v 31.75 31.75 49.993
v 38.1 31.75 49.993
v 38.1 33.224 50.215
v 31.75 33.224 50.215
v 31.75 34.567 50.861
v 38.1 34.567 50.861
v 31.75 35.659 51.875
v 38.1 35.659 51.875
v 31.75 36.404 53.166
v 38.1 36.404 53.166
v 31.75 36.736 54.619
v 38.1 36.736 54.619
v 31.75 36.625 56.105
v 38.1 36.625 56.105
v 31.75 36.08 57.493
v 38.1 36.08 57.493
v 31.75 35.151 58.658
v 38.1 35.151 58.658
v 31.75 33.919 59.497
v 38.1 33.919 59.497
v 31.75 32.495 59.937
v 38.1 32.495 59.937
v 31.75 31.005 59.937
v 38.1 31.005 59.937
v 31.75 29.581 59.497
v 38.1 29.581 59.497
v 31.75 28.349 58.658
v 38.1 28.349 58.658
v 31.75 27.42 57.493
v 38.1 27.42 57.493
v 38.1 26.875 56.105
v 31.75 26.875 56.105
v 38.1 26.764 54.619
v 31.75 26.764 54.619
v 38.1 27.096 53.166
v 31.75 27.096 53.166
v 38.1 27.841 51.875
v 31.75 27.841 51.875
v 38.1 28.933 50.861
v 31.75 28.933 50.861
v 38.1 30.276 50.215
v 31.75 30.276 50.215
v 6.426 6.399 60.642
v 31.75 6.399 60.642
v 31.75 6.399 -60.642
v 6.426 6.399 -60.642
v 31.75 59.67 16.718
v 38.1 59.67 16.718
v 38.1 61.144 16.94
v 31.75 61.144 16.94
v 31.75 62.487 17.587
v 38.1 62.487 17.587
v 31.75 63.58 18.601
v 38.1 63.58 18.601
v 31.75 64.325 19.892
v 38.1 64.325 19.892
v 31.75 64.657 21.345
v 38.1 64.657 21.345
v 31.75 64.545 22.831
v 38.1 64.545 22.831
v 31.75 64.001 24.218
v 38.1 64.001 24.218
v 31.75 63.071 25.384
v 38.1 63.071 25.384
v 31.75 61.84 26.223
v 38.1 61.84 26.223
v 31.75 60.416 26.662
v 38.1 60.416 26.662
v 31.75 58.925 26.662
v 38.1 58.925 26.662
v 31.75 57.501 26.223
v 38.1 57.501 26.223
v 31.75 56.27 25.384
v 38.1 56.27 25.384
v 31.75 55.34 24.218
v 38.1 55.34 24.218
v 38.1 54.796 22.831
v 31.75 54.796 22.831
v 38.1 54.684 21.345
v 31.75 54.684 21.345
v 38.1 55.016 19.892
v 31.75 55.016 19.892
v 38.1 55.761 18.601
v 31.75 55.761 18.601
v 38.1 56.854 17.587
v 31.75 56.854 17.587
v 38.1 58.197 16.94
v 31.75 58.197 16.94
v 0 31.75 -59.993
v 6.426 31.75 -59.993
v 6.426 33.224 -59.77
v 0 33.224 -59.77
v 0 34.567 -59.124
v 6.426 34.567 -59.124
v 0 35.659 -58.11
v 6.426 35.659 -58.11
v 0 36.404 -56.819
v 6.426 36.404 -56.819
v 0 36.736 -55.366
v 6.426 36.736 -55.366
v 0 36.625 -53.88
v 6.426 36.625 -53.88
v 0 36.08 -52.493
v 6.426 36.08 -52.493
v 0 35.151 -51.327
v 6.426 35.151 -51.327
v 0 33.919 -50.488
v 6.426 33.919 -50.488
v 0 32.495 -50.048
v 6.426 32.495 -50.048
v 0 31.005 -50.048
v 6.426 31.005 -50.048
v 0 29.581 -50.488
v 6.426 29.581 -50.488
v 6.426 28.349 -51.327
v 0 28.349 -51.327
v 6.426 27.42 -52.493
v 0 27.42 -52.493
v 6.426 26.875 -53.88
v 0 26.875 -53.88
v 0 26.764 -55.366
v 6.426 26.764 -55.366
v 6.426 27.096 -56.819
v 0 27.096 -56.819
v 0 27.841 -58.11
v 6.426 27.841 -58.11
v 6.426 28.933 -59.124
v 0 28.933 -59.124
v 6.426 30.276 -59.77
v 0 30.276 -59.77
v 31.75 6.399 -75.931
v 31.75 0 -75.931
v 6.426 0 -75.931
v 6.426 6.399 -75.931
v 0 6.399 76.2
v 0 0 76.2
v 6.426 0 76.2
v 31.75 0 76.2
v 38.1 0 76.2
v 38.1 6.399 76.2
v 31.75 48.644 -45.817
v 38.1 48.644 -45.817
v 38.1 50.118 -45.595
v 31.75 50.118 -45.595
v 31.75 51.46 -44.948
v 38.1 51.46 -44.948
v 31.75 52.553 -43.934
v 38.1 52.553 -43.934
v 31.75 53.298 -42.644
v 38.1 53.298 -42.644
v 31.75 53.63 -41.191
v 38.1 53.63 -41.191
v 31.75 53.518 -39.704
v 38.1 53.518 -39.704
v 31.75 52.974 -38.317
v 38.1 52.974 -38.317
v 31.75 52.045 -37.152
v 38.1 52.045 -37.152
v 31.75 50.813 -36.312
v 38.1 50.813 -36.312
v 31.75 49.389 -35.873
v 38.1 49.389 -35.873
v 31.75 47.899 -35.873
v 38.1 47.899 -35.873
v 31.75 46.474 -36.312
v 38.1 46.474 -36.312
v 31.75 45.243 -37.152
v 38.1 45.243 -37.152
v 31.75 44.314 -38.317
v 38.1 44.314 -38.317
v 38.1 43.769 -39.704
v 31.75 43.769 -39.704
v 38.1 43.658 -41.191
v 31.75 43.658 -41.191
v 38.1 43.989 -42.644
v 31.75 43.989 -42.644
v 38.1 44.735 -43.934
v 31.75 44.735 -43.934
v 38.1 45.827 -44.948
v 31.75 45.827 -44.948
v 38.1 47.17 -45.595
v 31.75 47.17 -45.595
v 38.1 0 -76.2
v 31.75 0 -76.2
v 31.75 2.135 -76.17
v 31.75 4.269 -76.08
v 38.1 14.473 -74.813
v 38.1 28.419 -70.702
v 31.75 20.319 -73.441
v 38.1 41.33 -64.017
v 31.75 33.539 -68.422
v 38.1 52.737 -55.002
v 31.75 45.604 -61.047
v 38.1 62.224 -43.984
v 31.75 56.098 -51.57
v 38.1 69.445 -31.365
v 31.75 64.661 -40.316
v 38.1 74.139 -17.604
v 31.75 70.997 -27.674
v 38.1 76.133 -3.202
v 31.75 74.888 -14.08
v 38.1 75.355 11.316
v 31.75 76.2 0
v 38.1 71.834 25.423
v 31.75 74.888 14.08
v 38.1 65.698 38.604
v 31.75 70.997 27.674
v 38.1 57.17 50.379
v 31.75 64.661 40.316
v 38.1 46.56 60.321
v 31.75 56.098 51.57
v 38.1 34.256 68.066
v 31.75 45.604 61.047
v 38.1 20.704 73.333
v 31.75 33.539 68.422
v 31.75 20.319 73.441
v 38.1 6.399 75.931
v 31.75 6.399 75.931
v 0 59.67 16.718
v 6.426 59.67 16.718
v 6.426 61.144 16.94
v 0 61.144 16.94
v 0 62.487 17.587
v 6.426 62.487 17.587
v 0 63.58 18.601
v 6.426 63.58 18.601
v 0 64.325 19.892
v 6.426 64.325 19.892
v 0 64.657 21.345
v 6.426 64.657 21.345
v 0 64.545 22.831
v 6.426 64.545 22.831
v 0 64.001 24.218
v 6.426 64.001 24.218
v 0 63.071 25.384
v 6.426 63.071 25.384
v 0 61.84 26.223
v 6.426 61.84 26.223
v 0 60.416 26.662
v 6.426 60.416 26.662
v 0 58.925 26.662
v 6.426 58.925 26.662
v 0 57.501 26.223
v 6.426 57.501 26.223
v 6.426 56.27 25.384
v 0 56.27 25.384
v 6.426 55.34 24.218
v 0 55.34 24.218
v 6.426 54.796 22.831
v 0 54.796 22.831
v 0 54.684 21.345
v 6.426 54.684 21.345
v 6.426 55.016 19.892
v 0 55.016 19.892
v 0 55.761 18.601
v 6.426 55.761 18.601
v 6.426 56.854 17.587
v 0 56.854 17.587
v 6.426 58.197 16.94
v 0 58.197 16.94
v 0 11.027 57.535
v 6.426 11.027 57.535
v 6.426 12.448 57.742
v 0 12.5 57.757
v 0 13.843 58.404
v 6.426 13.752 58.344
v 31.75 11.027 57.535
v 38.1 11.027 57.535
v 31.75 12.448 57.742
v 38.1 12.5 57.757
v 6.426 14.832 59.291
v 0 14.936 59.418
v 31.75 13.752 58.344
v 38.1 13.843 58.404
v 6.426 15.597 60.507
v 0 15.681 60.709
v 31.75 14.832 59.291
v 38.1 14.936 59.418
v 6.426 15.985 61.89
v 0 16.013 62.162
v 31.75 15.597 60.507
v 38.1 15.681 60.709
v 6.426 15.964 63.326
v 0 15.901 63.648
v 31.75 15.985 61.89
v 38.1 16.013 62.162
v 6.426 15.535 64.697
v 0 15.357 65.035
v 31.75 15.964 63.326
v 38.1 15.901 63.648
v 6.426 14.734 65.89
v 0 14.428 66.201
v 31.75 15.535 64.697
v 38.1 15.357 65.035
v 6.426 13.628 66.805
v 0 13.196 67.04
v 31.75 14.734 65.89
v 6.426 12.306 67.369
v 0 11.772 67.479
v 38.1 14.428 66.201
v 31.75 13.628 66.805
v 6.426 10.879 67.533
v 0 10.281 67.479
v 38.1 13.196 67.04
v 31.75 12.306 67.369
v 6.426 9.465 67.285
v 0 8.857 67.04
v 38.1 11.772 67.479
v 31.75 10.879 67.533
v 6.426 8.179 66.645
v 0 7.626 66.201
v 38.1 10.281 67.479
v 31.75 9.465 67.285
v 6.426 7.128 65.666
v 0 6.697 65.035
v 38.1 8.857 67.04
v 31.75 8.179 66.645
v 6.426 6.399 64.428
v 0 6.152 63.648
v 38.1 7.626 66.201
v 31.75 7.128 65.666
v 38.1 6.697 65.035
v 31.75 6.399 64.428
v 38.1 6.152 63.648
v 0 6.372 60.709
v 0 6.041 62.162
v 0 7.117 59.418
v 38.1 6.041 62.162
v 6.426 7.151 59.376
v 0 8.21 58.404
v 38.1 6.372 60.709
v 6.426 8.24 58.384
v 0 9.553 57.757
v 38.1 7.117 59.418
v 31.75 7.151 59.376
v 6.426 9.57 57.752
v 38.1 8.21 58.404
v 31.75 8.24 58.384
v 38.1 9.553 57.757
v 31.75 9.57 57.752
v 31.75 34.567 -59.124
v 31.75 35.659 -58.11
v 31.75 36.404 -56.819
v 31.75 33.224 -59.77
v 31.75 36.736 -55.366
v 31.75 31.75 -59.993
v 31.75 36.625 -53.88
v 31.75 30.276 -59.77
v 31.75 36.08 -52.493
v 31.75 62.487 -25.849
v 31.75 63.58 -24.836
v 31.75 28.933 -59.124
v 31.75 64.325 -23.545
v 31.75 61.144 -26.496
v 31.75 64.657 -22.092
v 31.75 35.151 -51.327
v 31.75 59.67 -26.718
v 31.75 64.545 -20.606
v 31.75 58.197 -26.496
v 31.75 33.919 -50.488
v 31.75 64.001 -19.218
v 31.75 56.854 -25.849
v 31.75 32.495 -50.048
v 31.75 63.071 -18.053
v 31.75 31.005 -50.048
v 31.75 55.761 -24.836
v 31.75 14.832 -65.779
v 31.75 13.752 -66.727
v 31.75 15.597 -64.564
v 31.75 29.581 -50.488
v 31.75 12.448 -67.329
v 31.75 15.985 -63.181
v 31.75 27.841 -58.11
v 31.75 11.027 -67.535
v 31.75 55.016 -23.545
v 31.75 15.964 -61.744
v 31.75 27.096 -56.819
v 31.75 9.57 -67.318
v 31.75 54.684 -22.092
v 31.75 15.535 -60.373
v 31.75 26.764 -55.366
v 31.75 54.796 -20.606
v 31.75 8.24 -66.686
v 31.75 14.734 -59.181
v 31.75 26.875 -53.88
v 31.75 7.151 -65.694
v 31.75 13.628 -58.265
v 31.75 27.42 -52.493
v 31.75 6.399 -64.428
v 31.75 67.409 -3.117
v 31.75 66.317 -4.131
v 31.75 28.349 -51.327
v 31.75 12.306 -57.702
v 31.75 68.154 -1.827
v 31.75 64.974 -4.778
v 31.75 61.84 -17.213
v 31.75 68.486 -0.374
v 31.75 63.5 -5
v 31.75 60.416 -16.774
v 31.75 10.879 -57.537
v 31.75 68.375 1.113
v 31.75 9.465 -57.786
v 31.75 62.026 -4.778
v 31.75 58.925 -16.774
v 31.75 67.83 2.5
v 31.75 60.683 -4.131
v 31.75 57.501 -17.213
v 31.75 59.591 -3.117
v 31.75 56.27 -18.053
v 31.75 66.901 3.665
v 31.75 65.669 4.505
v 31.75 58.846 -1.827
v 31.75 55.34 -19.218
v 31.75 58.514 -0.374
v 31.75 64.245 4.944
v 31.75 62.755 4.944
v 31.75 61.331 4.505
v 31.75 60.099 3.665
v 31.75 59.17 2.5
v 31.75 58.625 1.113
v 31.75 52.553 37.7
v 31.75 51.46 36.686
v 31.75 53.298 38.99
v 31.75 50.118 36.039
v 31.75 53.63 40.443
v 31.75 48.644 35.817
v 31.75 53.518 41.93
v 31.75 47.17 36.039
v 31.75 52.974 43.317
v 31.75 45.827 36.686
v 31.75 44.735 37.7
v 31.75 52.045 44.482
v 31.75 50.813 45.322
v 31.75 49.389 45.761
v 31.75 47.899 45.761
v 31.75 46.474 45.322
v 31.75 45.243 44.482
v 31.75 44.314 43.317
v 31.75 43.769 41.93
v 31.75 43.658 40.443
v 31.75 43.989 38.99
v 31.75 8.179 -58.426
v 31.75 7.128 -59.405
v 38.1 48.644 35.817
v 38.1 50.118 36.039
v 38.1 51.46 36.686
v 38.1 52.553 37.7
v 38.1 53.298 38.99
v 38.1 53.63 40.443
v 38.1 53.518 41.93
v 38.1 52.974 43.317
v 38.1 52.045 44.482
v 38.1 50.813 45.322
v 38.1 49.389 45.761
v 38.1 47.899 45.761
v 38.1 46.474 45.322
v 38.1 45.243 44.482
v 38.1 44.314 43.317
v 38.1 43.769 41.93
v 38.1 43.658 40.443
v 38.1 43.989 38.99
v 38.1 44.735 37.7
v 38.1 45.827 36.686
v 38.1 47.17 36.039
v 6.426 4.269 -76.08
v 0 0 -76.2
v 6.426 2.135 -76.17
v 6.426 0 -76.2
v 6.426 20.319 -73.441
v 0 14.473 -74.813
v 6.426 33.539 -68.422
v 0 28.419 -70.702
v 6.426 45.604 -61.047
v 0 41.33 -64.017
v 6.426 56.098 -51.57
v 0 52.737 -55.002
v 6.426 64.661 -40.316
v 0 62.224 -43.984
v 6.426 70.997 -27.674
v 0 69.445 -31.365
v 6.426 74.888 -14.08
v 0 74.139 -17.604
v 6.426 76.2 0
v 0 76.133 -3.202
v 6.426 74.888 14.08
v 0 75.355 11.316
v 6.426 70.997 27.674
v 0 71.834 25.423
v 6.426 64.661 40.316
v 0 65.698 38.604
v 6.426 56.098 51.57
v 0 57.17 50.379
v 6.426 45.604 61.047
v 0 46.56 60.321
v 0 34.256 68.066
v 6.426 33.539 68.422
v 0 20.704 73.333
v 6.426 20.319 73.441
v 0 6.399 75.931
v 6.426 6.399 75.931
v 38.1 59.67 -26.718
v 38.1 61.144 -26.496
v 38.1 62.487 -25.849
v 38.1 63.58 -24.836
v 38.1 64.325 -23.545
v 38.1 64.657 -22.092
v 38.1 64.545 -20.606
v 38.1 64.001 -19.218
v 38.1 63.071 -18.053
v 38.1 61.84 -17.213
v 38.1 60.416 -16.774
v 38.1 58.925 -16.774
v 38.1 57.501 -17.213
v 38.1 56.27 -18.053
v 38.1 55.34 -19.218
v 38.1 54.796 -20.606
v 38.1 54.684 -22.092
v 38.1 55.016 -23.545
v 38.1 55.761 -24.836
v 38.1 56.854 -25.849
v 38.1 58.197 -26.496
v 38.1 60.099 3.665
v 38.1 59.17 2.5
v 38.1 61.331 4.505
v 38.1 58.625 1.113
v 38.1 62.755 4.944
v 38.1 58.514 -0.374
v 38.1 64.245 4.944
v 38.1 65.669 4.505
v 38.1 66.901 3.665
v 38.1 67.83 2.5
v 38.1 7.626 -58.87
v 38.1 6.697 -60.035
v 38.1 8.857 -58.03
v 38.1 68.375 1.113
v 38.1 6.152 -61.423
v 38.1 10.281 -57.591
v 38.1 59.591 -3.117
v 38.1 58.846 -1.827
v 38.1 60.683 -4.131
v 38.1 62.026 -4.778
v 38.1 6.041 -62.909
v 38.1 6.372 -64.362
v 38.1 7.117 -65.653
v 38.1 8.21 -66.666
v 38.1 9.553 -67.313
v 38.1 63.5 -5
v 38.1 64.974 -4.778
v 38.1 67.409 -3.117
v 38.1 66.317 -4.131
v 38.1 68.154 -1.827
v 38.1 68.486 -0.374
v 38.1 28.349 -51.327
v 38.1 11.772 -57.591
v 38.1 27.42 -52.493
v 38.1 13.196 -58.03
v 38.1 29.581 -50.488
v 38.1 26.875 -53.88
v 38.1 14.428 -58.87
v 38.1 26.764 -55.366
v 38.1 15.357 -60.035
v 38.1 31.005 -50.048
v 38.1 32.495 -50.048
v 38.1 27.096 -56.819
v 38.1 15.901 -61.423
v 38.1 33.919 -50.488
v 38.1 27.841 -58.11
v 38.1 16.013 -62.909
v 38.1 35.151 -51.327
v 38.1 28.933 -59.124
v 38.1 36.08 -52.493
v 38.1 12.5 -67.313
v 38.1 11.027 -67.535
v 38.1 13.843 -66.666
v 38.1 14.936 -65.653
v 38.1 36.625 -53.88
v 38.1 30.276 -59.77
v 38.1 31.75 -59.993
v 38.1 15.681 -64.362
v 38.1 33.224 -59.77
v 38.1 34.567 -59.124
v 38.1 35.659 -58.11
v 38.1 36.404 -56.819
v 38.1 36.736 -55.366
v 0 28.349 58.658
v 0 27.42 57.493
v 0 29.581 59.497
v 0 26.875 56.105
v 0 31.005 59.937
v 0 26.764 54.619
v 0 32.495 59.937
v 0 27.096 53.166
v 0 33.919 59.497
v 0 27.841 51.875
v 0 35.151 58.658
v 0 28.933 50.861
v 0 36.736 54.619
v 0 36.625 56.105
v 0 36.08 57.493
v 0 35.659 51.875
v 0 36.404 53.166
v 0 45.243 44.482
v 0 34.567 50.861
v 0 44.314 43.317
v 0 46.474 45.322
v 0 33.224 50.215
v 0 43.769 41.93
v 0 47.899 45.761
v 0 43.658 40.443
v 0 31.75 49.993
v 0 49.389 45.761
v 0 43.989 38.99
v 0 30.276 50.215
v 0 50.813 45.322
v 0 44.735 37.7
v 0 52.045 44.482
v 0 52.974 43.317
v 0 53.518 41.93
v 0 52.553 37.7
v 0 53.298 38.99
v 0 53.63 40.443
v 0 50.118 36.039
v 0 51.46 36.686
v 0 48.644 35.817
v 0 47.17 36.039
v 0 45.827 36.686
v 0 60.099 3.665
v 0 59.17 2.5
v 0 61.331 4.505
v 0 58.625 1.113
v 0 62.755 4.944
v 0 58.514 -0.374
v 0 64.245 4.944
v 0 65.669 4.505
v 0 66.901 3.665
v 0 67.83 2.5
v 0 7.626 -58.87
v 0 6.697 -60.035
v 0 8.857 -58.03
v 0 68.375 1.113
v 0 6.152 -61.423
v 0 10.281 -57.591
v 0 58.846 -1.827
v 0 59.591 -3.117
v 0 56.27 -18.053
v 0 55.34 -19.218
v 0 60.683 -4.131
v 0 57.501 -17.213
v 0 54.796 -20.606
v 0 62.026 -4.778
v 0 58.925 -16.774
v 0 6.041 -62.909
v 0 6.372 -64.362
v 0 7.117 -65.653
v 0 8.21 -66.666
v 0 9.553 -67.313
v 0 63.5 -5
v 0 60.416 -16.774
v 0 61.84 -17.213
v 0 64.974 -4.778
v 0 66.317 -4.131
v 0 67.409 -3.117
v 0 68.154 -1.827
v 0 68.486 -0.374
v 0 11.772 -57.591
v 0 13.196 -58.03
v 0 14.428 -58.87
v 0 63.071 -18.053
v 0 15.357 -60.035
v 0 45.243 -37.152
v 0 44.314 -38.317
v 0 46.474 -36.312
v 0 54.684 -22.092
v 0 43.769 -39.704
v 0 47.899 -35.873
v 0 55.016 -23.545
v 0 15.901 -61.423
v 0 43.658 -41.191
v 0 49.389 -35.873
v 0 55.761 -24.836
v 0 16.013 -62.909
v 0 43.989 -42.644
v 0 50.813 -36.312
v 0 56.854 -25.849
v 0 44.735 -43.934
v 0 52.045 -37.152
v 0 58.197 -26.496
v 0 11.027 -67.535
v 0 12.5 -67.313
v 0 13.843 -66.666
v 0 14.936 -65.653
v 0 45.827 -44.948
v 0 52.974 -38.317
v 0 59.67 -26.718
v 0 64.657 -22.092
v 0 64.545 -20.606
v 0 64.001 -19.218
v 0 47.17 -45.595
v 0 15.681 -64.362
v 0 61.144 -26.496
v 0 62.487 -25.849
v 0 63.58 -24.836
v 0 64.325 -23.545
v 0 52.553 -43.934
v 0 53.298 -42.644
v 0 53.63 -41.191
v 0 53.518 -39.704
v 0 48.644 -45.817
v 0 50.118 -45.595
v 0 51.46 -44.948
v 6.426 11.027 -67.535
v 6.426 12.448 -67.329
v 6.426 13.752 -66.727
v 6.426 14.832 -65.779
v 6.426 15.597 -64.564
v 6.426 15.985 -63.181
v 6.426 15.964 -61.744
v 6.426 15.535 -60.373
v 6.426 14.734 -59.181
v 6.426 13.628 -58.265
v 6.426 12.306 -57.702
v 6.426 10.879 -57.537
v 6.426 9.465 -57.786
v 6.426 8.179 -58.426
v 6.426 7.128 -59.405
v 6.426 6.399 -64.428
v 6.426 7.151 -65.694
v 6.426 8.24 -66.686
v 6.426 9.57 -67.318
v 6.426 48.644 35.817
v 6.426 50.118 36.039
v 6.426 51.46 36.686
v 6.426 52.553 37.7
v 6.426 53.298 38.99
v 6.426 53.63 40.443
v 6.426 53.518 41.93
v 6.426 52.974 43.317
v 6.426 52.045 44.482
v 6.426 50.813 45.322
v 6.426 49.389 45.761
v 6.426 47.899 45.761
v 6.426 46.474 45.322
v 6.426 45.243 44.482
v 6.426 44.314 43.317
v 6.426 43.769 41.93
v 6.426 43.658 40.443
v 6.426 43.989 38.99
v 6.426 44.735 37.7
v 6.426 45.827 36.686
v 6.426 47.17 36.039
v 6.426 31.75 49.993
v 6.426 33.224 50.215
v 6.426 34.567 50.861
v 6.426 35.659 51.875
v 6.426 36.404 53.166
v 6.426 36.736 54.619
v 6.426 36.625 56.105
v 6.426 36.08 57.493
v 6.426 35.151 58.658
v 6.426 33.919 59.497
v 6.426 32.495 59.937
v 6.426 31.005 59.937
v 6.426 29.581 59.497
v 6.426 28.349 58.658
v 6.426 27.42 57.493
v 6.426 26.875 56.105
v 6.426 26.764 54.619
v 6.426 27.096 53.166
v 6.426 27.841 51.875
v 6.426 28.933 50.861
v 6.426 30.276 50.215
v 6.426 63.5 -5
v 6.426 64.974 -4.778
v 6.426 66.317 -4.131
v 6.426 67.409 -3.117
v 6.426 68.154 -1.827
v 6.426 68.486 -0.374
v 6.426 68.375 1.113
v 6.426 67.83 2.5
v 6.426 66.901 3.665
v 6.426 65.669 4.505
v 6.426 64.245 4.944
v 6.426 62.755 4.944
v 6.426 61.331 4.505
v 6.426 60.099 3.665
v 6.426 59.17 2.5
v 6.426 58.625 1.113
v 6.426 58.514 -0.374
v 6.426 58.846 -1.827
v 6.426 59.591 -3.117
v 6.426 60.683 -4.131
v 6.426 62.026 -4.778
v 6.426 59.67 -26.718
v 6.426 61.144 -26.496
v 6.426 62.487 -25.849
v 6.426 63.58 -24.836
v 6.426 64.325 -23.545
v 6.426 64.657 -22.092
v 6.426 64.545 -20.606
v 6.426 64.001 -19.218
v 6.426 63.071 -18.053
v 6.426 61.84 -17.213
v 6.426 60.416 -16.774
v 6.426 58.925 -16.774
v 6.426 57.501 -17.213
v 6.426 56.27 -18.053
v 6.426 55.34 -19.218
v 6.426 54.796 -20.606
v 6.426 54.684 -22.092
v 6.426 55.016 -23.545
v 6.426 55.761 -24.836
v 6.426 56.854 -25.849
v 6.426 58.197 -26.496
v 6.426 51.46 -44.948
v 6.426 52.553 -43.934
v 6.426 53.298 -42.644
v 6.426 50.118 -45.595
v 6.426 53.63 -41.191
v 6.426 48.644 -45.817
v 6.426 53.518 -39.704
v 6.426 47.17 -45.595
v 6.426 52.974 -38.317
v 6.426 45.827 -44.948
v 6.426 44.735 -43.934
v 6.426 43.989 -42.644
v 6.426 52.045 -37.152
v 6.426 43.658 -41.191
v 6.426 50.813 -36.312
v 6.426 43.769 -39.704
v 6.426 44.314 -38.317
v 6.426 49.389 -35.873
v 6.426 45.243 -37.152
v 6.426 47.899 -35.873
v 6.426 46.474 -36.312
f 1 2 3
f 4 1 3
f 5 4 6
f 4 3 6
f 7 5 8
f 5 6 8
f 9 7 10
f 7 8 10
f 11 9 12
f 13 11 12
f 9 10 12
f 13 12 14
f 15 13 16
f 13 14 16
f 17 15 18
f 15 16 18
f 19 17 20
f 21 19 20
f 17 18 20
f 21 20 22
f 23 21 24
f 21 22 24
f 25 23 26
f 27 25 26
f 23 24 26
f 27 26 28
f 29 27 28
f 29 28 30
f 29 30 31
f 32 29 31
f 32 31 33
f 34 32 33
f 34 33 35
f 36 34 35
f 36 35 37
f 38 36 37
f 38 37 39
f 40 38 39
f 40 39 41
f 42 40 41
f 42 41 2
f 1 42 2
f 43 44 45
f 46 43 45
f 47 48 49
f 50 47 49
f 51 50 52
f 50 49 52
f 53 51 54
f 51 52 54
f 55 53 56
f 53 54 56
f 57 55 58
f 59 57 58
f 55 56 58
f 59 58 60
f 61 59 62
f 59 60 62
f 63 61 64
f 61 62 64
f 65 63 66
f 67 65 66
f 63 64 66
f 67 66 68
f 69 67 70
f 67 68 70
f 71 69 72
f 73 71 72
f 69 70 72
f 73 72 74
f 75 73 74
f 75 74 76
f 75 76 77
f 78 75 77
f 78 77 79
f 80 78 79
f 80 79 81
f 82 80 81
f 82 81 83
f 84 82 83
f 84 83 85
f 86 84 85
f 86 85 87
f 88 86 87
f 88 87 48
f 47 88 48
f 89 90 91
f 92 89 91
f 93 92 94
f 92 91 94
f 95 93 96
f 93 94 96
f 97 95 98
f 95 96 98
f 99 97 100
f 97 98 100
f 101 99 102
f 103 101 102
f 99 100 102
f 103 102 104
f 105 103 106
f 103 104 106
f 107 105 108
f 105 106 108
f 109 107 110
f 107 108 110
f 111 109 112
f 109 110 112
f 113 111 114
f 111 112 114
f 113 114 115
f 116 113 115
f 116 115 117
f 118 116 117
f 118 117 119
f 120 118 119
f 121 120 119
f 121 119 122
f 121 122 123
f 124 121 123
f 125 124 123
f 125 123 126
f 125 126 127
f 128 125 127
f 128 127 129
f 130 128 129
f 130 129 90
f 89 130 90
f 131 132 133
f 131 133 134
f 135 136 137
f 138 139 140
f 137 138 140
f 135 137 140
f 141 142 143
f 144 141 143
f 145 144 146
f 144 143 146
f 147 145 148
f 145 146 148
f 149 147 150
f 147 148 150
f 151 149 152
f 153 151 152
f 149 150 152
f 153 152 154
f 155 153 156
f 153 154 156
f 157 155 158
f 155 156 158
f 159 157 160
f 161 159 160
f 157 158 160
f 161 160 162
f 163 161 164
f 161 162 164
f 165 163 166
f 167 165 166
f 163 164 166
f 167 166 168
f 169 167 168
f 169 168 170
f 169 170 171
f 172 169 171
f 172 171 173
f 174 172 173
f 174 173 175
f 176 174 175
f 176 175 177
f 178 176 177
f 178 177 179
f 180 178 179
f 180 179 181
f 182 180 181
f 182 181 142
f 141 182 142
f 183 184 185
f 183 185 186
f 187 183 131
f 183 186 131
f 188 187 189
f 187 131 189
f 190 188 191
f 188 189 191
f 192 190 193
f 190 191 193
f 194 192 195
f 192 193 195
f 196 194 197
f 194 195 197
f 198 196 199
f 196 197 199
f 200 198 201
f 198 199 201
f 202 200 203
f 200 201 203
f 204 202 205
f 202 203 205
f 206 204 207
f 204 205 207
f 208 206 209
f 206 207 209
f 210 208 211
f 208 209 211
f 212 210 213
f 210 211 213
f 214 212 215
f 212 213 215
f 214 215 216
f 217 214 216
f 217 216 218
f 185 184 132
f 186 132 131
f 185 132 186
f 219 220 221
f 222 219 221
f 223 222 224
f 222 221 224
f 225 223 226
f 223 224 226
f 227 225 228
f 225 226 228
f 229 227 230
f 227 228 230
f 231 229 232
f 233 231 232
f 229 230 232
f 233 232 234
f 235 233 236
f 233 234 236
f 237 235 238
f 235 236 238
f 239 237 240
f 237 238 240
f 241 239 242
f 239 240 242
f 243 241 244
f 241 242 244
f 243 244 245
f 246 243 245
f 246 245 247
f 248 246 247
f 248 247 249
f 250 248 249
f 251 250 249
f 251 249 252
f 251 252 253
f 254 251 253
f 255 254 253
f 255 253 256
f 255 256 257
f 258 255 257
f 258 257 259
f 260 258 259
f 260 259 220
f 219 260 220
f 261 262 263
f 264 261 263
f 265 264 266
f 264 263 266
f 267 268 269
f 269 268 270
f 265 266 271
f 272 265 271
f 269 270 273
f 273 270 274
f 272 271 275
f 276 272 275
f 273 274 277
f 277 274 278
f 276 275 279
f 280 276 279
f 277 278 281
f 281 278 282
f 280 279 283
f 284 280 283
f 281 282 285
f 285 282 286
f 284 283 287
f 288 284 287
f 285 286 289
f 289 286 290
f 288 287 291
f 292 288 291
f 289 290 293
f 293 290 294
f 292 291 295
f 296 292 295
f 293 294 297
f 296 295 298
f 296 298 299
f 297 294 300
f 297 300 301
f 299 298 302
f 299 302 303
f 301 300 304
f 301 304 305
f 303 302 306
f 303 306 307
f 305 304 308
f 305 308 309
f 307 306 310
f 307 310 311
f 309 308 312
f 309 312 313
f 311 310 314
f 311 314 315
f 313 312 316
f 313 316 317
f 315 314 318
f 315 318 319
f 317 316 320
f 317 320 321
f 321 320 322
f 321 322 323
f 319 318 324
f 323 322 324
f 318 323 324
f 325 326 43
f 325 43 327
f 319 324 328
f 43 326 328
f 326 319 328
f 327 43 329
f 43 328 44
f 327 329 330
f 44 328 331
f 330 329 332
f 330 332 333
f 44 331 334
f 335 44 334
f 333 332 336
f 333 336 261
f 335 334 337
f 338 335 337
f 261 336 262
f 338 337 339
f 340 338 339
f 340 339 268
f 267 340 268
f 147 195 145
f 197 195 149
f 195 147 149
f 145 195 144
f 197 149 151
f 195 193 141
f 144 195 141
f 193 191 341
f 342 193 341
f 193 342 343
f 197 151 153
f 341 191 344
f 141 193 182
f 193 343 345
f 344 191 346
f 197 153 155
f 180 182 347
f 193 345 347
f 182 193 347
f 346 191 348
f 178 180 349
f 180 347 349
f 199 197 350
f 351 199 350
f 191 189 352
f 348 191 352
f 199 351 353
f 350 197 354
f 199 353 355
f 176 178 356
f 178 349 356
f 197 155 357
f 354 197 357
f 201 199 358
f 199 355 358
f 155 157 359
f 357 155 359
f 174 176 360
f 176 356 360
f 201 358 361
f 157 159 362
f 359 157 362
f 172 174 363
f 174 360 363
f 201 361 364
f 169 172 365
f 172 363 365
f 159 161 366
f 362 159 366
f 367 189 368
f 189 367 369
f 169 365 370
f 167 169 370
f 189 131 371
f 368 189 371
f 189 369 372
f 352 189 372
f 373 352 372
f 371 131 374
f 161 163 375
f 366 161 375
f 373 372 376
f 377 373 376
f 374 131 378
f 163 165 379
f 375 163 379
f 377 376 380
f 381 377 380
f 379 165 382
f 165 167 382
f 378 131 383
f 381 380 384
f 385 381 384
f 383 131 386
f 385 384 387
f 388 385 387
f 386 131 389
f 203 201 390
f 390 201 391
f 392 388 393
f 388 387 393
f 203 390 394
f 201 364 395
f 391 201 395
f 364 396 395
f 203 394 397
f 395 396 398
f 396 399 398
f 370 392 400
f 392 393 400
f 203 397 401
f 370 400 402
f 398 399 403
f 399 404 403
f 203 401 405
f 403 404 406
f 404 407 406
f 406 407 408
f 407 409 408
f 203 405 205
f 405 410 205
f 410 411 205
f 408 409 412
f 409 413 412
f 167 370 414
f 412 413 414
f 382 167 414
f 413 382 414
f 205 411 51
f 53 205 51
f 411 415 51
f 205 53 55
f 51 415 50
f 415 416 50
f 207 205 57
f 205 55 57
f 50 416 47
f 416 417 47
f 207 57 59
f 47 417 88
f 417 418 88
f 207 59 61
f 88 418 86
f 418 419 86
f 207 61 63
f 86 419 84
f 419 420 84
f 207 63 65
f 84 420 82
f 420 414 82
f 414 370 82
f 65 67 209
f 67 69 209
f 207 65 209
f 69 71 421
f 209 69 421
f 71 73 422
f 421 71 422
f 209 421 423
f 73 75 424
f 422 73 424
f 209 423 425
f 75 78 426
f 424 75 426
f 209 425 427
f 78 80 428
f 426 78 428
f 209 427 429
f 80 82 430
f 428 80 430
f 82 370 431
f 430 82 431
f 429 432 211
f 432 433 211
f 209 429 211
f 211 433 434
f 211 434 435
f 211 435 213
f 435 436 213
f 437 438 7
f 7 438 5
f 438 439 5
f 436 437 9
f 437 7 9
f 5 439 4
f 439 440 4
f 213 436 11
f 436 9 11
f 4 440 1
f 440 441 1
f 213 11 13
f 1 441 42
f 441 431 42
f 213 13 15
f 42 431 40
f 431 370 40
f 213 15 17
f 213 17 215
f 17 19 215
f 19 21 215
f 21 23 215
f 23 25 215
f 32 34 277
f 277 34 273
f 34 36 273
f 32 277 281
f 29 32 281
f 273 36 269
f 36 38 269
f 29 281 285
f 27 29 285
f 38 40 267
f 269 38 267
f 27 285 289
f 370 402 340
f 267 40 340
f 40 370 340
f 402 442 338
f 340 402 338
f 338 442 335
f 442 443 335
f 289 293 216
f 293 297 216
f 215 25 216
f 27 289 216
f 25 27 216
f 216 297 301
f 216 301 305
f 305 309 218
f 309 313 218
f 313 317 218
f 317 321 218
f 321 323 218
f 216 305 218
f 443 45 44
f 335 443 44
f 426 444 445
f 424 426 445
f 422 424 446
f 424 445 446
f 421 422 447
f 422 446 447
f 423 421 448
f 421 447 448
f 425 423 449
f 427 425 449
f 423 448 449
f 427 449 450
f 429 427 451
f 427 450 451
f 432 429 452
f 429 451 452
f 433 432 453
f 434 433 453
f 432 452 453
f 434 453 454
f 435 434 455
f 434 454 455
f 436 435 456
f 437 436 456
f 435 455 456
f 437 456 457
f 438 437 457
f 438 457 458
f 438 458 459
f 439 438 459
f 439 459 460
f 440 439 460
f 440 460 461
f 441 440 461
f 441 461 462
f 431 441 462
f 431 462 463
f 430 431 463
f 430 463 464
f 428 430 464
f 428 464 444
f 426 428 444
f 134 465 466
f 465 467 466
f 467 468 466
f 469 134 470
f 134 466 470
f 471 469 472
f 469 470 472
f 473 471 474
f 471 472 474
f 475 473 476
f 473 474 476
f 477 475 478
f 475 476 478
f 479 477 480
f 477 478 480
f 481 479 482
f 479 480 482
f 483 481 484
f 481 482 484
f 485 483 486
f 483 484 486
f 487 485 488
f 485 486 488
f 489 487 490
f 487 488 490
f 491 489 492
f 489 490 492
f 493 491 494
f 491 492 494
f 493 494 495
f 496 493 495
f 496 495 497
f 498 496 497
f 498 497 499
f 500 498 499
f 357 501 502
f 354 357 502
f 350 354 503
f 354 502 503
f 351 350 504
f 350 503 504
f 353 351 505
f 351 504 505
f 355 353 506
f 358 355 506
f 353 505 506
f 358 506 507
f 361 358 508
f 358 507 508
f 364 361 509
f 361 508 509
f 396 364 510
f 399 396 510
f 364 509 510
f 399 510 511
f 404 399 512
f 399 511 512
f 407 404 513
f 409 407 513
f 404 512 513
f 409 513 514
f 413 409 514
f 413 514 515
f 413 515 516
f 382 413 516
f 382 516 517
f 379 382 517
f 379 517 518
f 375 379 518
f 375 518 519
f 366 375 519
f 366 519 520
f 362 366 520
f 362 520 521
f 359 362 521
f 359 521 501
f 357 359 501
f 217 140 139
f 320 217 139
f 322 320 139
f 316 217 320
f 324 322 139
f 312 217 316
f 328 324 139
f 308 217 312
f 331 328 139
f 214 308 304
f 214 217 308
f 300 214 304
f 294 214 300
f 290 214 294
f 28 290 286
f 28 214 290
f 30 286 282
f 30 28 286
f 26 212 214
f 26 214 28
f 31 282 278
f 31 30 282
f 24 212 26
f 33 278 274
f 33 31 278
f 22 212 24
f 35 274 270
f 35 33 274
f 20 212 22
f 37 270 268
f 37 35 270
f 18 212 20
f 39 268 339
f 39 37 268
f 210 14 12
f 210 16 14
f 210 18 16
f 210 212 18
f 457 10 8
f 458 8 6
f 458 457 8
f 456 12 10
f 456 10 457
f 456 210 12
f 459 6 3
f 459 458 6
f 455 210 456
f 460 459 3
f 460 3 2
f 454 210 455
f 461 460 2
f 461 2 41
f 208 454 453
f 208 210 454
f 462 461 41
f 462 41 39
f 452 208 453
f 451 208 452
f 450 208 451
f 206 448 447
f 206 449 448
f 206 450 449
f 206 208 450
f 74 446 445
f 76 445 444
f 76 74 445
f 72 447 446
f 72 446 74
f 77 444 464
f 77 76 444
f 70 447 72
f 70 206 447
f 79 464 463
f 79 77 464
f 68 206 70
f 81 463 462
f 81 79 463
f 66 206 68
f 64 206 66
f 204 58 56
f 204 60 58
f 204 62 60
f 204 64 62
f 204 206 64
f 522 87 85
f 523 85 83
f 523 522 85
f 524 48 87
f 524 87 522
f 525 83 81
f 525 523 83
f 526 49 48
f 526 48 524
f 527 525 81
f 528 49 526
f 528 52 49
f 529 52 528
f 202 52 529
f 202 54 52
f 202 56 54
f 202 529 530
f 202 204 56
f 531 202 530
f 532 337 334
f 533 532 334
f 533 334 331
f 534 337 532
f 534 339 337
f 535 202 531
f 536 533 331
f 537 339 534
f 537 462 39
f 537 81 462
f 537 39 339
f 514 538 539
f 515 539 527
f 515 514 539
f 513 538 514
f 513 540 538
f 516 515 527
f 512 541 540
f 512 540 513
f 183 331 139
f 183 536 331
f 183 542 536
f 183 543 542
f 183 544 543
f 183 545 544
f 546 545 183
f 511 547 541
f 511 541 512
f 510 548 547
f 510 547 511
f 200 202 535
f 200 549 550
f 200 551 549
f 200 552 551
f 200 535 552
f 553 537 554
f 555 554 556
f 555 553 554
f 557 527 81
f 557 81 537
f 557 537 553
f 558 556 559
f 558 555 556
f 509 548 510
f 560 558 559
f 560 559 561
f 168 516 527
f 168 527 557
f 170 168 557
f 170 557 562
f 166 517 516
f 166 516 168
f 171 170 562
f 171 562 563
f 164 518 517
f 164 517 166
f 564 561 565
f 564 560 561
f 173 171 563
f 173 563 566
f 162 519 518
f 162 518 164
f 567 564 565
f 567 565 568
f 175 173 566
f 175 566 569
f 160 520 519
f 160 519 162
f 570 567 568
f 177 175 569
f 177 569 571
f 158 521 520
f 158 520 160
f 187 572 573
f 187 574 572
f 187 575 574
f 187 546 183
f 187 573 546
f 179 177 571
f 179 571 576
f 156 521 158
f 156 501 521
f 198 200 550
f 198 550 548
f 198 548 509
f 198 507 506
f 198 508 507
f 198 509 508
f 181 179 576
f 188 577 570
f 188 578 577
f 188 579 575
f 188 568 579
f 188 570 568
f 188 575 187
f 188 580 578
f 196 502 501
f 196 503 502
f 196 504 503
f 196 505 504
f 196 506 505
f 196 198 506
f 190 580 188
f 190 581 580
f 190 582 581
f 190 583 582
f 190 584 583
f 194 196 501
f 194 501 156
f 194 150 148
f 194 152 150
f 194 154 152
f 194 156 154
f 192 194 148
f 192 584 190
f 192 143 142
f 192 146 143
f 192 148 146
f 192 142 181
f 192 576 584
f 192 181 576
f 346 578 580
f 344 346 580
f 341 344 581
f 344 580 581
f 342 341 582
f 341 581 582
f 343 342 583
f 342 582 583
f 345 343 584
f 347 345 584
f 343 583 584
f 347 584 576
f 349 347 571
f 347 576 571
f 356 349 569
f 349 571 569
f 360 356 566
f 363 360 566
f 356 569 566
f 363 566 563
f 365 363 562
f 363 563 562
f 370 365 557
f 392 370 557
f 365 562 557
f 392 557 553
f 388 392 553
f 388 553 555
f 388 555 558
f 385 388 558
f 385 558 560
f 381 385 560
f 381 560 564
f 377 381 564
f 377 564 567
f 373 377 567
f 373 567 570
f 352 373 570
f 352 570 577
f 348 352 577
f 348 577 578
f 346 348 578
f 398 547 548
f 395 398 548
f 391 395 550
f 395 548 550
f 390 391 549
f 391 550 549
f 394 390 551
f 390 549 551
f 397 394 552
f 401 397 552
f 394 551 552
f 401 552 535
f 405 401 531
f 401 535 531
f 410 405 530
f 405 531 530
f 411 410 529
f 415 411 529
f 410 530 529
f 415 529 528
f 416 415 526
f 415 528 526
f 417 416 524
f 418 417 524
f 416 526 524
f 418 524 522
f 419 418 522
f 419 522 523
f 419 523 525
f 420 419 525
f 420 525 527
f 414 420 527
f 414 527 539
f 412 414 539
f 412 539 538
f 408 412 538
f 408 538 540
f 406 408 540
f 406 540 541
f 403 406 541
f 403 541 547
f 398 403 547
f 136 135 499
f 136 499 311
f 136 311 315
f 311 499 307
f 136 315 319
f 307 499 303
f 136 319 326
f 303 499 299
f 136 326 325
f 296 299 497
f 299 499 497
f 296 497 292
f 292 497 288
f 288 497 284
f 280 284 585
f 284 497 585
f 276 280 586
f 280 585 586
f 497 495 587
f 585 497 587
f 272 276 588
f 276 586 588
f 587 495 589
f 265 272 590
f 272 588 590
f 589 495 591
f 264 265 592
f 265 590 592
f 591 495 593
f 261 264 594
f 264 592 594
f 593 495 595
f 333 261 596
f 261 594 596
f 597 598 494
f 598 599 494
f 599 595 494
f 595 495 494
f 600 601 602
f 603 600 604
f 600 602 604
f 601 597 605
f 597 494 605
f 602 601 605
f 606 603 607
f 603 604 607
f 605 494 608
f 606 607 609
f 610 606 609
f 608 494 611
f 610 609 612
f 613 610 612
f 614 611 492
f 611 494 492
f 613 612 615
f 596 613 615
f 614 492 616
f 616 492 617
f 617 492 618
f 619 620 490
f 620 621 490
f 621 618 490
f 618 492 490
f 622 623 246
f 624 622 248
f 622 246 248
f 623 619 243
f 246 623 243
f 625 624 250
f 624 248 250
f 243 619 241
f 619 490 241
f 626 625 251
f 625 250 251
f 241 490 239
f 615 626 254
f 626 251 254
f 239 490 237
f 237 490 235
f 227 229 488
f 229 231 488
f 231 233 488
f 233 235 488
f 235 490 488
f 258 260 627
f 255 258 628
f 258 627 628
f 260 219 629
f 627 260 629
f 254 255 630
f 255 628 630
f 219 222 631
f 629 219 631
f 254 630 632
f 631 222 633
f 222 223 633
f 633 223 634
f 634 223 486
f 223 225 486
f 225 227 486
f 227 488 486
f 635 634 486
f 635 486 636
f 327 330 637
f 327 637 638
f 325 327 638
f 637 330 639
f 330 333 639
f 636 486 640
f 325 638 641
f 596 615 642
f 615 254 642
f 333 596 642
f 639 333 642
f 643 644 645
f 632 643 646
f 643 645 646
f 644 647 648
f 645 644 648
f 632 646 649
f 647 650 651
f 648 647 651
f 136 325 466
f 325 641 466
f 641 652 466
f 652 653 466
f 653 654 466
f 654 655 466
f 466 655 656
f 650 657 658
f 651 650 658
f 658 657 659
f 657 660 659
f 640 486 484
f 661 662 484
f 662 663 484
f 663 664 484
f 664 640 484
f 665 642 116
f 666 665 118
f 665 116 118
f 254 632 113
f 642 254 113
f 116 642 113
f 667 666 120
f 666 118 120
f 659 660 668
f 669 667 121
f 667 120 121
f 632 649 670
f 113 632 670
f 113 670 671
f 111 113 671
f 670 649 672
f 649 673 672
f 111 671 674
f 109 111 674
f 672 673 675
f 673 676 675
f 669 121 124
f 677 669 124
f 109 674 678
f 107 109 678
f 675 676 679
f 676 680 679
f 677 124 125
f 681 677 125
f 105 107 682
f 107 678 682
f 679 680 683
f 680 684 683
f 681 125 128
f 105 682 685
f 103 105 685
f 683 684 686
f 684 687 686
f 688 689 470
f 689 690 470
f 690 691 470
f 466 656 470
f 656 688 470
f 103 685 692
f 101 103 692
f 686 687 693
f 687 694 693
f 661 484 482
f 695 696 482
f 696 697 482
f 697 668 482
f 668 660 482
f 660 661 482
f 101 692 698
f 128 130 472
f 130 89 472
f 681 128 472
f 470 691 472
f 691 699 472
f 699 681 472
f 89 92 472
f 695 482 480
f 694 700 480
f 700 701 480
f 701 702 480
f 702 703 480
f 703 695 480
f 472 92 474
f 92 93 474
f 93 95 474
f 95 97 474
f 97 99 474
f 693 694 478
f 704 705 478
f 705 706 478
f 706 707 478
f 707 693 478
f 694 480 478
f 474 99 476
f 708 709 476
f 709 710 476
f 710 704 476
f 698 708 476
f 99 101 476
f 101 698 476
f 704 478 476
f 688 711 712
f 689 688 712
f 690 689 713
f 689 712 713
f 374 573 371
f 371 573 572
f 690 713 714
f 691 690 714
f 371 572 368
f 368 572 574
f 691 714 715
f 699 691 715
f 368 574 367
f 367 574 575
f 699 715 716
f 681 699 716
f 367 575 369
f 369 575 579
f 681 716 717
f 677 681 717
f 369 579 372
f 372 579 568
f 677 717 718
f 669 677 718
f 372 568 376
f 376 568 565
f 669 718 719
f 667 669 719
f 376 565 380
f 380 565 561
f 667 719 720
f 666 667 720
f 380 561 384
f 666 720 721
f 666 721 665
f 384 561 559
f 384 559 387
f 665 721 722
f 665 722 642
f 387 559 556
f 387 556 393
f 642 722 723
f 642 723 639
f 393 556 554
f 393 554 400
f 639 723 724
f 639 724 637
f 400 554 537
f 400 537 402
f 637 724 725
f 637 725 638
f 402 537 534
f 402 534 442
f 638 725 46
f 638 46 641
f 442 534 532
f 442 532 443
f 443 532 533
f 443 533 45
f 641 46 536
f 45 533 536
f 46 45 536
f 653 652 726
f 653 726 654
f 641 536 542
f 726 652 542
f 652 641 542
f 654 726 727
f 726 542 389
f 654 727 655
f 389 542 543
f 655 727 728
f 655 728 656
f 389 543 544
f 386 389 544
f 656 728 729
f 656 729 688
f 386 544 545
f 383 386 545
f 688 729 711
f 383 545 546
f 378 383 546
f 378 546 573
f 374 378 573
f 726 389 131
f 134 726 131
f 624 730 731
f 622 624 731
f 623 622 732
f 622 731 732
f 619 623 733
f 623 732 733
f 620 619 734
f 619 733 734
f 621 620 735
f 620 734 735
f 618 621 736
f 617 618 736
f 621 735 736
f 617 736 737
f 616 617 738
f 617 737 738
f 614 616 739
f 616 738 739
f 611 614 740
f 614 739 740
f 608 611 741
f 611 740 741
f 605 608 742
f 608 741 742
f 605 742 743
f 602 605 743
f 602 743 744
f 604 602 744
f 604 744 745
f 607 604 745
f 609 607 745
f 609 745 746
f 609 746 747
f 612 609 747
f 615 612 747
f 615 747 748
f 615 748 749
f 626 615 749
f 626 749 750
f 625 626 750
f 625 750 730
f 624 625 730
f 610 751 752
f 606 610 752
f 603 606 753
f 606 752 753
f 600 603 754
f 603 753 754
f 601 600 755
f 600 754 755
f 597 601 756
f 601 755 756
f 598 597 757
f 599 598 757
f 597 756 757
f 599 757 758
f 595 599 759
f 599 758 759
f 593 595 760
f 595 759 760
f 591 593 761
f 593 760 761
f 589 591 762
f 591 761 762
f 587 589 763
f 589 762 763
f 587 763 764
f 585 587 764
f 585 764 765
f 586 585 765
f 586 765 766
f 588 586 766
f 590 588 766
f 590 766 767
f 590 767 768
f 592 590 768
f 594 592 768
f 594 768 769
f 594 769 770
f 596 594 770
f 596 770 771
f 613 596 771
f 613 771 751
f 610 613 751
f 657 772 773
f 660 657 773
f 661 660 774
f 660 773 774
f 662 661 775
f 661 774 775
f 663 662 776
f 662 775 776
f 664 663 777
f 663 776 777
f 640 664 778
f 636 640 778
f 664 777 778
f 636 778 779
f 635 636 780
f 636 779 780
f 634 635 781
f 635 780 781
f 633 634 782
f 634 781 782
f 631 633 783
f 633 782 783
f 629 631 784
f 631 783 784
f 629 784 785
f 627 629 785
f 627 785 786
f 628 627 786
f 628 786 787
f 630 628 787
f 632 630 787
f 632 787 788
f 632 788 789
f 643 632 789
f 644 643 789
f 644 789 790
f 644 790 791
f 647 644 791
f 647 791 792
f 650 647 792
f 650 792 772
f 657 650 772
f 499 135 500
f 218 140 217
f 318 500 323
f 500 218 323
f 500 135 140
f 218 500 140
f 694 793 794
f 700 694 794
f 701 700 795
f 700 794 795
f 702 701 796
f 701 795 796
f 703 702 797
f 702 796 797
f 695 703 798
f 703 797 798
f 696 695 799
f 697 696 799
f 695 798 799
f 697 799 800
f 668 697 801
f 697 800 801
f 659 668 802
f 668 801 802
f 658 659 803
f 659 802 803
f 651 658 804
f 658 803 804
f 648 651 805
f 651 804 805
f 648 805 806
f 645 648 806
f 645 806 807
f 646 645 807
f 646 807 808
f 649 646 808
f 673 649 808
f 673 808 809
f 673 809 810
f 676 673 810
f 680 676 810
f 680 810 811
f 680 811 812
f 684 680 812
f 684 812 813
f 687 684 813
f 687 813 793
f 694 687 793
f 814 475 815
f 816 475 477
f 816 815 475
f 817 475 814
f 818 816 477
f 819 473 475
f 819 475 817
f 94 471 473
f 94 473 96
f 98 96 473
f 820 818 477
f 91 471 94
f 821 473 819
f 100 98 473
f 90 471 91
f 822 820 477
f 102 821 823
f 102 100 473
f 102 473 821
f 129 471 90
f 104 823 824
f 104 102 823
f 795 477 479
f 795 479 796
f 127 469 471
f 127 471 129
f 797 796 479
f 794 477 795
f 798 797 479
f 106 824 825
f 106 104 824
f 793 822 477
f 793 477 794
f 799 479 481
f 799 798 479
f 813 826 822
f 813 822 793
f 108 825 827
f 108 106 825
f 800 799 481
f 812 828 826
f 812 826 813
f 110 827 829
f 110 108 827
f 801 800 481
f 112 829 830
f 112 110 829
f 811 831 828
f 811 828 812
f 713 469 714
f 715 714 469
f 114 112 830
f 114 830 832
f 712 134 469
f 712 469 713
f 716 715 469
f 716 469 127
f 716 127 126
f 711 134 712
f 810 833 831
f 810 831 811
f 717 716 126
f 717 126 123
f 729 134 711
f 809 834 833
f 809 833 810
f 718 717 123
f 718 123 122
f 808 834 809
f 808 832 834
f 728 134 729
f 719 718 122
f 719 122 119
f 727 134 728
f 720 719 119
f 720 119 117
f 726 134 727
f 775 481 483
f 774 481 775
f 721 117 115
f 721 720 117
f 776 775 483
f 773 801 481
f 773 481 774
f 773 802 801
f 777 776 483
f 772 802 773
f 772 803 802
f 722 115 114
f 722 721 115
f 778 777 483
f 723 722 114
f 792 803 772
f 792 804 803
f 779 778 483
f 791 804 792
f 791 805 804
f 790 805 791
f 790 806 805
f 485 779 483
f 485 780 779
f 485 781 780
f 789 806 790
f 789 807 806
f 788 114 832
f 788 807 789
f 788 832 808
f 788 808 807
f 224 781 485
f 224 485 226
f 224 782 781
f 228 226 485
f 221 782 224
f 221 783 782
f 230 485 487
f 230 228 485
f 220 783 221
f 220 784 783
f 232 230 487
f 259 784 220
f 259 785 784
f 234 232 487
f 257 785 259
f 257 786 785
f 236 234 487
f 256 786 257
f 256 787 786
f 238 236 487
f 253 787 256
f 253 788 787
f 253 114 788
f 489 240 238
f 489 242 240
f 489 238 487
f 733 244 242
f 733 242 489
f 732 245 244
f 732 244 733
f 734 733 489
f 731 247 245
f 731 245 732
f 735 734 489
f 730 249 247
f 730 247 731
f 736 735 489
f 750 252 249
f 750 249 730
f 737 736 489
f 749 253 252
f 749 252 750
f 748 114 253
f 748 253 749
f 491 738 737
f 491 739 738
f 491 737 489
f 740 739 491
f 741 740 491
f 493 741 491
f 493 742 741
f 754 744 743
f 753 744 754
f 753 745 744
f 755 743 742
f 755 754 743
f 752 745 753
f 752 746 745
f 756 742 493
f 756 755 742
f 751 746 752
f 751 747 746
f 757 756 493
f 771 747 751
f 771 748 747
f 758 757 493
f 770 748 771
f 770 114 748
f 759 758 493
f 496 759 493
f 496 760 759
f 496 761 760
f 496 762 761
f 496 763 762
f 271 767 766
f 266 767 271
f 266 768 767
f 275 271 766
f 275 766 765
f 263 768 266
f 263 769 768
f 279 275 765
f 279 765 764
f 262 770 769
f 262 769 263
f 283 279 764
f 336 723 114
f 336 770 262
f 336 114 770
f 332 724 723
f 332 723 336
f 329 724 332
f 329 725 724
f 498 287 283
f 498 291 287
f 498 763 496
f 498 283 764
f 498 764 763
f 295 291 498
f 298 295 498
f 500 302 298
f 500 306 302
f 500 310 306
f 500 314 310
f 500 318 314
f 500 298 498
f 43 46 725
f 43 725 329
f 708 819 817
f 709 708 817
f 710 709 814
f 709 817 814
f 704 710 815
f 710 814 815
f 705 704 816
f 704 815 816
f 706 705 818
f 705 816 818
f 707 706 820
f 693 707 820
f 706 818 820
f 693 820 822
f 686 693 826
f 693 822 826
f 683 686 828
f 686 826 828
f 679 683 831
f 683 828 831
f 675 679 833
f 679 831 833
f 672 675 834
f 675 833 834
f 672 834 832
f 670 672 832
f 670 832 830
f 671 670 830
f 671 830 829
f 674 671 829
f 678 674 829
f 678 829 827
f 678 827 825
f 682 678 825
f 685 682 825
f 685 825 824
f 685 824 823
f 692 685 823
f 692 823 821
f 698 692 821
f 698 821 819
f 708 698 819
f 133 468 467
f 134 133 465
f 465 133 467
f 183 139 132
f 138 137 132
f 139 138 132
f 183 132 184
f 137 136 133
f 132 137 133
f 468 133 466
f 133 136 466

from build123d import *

# Parameters (mm, degrees)
BOSS_EXTRUDE1_DEPTH = 38.1
SKETCH2_W           = 25.3238
SKETCH2_H           = 160.690428667
CUT_EXTRUDE1_DEPTH  = 77.2
SKETCH3_W           = 152.130858671
SKETCH3_H           = 6.398804689
BOSS_EXTRUDE2_DEPTH = 38.1
SKETCH4_R           = 5.0000027
CUT_EXTRUDE2_DEPTH  = 39.1


with BuildPart() as part:
    # Sketch1 → Boss-Extrude1 (new body)
    with BuildSketch(Plane(origin=(0, 0, 0), x_dir=(0, 0, -1), z_dir=(1, 0, 0))):
        with BuildLine():
            Line((-76.2, 0), (76.2, 0))
            ThreePointArc((76.2, 0), (0, 76.2), (-76.2, 0))
        make_face()
    extrude(amount=BOSS_EXTRUDE1_DEPTH)

    # Sketch2 → Cut-Extrude1 (cut, through all)
    with BuildSketch(Plane.XZ):
        with Locations((19.0881, -0.10655864)):
            Rectangle(SKETCH2_W, SKETCH2_H)
    extrude(amount=-CUT_EXTRUDE1_DEPTH, mode=Mode.SUBTRACT)

    # Sketch3 → Boss-Extrude2 (add)
    with BuildSketch(Plane(origin=(38.1, 0, 0), x_dir=(0, 0, -1), z_dir=(1, 0, 0))):
        with Locations((-0.134570664, 3.199402345)):
            Rectangle(SKETCH3_W, SKETCH3_H)
    extrude(amount=-BOSS_EXTRUDE2_DEPTH)

    # Sketch4 → Cut-Extrude2 (cut, through all)
    with BuildSketch(Plane(origin=(38.1, 0, 0), x_dir=(0, 0, -1), z_dir=(1, 0, 0))):
        with Locations((0, 63.5)):
            Circle(SKETCH4_R)
        with Locations((21.718279101, 59.67048142)):
            Circle(SKETCH4_R)
        with Locations((40.817013215, 48.643822138)):
            Circle(SKETCH4_R)
        with Locations((54.99261314, 31.75)):
            Circle(SKETCH4_R)
        with Locations((62.535292316, 11.026659282)):
            Circle(SKETCH4_R)
        with Locations((-62.535292316, 11.026659282)):
            Circle(SKETCH4_R)
        with Locations((-54.99261314, 31.75)):
            Circle(SKETCH4_R)
        with Locations((-40.817013215, 48.643822138)):
            Circle(SKETCH4_R)
        with Locations((-21.718279101, 59.67048142)):
            Circle(SKETCH4_R)
    extrude(amount=-CUT_EXTRUDE2_DEPTH, mode=Mode.SUBTRACT)


solid = part.part
